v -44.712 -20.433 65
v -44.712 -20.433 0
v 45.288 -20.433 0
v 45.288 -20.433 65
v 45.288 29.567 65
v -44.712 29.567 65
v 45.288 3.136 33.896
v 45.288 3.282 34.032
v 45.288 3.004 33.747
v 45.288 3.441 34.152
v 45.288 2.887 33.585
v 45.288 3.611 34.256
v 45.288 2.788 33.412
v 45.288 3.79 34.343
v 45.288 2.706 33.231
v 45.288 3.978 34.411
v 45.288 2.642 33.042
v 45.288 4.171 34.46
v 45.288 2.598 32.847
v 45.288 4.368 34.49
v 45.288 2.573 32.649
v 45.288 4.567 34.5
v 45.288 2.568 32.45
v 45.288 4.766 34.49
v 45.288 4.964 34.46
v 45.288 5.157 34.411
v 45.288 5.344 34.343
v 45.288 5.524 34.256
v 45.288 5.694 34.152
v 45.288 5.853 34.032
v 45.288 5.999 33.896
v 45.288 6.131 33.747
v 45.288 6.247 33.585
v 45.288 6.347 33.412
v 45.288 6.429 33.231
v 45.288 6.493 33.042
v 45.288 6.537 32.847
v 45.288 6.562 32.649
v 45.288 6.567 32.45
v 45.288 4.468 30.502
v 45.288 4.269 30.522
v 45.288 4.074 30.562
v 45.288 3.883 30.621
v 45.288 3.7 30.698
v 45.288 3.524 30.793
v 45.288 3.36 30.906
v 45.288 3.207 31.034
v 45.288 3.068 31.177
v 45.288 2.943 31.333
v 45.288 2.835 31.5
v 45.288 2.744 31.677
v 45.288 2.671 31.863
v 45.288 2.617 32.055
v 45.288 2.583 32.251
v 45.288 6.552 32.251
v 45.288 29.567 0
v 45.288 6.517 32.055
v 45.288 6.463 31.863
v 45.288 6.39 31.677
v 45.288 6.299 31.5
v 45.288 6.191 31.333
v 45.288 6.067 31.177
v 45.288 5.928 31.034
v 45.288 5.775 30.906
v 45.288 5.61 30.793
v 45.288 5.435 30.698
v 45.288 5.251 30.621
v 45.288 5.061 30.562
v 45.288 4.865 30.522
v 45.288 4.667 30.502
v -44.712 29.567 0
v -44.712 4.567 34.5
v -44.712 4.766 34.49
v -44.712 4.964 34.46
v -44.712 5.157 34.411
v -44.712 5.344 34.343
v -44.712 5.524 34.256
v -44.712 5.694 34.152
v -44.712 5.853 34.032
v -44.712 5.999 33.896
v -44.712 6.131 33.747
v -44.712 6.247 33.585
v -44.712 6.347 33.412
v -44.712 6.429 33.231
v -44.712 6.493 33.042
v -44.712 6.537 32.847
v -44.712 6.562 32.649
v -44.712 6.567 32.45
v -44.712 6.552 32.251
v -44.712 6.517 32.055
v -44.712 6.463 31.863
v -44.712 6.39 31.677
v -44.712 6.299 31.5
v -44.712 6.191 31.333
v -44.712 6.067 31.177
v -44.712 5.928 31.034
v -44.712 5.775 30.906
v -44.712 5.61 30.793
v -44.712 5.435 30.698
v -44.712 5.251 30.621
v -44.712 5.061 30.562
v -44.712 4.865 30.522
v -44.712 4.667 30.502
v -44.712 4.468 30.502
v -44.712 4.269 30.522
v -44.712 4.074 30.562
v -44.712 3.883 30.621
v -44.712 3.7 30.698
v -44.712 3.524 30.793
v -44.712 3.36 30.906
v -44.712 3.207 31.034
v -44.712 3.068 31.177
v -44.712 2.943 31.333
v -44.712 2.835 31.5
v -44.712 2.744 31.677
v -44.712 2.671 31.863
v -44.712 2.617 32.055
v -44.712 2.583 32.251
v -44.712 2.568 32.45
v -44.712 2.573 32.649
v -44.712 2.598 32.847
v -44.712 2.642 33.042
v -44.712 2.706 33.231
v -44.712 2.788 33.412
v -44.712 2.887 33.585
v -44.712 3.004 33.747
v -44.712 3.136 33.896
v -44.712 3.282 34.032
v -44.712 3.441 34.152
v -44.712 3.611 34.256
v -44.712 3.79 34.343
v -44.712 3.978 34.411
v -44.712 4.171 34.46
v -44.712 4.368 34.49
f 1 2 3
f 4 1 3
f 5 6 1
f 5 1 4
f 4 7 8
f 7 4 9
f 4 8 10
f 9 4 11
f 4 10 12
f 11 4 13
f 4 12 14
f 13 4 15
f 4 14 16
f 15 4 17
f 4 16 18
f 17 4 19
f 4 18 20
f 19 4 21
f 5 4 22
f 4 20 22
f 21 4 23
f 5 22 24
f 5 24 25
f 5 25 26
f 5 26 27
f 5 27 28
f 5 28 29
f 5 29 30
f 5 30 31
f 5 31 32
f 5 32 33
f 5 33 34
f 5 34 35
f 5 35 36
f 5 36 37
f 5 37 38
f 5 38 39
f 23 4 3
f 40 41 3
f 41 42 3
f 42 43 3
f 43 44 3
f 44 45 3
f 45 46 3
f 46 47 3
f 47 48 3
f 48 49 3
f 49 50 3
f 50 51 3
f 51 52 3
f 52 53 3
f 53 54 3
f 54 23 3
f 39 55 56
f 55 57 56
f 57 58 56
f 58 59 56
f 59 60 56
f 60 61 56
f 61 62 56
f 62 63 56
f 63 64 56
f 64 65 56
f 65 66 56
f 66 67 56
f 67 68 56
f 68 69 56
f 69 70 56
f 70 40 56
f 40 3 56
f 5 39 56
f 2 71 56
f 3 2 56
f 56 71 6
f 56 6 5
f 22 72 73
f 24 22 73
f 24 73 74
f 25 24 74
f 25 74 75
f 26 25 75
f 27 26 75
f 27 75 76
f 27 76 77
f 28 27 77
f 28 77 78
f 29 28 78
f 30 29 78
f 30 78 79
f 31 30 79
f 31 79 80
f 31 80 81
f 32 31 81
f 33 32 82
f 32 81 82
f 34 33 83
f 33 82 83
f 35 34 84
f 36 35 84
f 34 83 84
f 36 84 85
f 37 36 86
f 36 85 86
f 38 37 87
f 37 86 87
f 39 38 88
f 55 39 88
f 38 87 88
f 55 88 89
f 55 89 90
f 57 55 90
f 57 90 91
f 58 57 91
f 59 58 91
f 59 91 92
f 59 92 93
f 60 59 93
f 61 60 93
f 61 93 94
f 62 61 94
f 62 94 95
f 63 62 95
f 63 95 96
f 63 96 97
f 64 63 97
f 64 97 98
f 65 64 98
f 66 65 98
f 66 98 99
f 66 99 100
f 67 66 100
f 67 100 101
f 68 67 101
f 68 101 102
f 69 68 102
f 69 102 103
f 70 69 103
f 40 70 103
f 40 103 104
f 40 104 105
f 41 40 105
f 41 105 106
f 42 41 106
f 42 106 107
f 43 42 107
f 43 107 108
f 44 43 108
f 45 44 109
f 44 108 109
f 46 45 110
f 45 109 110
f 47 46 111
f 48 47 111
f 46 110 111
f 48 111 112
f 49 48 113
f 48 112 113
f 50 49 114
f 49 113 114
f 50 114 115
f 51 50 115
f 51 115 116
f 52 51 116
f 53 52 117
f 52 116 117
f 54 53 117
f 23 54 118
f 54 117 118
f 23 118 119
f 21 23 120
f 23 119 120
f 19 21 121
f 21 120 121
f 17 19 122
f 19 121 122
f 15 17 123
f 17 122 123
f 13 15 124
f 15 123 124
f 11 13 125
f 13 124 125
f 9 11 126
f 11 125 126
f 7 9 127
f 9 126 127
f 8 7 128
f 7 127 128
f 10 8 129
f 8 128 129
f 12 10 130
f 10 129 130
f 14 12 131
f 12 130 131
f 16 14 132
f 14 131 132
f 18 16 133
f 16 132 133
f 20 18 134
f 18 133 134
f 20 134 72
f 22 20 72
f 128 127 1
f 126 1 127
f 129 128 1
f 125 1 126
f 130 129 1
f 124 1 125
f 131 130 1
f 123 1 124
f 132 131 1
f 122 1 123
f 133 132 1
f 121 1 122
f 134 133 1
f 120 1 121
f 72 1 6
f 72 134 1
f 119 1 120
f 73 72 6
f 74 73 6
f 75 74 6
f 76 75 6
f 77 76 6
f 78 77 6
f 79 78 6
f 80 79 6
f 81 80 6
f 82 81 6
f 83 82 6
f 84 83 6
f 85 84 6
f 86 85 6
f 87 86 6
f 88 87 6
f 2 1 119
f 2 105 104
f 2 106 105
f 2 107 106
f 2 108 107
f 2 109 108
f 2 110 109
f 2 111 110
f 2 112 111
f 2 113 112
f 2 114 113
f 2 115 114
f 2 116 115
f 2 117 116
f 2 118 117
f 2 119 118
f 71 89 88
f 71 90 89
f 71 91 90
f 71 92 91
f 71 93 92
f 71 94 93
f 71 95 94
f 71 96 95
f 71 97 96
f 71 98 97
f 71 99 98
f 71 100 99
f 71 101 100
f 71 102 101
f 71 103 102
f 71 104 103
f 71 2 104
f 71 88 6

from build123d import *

# Parameters (mm, degrees)
SKETCH_1_W          = 90
SKETCH_1_H          = 50
EXTRUDE_1_DEPTH     = 65
SKETCH_2_R          = 2
CUT_EXTRUDE_1_DEPTH = 115.887883104


with BuildPart() as part:
    # 草图1 → 凸台-拉伸1 (new body)
    with BuildSketch(Plane.XY):
        with Locations((0.288461538, 4.567307692)):
            Rectangle(SKETCH_1_W, SKETCH_1_H)
    extrude(amount=EXTRUDE_1_DEPTH)

    # 草图2 → 切除-拉伸1 (cut, through all)
    with BuildSketch(Plane.ZY.offset(44.711538462)):
        with Locations((32.5, 4.567307692)):
            Circle(SKETCH_2_R)
    extrude(amount=-CUT_EXTRUDE_1_DEPTH, mode=Mode.SUBTRACT)


solid = part.part
